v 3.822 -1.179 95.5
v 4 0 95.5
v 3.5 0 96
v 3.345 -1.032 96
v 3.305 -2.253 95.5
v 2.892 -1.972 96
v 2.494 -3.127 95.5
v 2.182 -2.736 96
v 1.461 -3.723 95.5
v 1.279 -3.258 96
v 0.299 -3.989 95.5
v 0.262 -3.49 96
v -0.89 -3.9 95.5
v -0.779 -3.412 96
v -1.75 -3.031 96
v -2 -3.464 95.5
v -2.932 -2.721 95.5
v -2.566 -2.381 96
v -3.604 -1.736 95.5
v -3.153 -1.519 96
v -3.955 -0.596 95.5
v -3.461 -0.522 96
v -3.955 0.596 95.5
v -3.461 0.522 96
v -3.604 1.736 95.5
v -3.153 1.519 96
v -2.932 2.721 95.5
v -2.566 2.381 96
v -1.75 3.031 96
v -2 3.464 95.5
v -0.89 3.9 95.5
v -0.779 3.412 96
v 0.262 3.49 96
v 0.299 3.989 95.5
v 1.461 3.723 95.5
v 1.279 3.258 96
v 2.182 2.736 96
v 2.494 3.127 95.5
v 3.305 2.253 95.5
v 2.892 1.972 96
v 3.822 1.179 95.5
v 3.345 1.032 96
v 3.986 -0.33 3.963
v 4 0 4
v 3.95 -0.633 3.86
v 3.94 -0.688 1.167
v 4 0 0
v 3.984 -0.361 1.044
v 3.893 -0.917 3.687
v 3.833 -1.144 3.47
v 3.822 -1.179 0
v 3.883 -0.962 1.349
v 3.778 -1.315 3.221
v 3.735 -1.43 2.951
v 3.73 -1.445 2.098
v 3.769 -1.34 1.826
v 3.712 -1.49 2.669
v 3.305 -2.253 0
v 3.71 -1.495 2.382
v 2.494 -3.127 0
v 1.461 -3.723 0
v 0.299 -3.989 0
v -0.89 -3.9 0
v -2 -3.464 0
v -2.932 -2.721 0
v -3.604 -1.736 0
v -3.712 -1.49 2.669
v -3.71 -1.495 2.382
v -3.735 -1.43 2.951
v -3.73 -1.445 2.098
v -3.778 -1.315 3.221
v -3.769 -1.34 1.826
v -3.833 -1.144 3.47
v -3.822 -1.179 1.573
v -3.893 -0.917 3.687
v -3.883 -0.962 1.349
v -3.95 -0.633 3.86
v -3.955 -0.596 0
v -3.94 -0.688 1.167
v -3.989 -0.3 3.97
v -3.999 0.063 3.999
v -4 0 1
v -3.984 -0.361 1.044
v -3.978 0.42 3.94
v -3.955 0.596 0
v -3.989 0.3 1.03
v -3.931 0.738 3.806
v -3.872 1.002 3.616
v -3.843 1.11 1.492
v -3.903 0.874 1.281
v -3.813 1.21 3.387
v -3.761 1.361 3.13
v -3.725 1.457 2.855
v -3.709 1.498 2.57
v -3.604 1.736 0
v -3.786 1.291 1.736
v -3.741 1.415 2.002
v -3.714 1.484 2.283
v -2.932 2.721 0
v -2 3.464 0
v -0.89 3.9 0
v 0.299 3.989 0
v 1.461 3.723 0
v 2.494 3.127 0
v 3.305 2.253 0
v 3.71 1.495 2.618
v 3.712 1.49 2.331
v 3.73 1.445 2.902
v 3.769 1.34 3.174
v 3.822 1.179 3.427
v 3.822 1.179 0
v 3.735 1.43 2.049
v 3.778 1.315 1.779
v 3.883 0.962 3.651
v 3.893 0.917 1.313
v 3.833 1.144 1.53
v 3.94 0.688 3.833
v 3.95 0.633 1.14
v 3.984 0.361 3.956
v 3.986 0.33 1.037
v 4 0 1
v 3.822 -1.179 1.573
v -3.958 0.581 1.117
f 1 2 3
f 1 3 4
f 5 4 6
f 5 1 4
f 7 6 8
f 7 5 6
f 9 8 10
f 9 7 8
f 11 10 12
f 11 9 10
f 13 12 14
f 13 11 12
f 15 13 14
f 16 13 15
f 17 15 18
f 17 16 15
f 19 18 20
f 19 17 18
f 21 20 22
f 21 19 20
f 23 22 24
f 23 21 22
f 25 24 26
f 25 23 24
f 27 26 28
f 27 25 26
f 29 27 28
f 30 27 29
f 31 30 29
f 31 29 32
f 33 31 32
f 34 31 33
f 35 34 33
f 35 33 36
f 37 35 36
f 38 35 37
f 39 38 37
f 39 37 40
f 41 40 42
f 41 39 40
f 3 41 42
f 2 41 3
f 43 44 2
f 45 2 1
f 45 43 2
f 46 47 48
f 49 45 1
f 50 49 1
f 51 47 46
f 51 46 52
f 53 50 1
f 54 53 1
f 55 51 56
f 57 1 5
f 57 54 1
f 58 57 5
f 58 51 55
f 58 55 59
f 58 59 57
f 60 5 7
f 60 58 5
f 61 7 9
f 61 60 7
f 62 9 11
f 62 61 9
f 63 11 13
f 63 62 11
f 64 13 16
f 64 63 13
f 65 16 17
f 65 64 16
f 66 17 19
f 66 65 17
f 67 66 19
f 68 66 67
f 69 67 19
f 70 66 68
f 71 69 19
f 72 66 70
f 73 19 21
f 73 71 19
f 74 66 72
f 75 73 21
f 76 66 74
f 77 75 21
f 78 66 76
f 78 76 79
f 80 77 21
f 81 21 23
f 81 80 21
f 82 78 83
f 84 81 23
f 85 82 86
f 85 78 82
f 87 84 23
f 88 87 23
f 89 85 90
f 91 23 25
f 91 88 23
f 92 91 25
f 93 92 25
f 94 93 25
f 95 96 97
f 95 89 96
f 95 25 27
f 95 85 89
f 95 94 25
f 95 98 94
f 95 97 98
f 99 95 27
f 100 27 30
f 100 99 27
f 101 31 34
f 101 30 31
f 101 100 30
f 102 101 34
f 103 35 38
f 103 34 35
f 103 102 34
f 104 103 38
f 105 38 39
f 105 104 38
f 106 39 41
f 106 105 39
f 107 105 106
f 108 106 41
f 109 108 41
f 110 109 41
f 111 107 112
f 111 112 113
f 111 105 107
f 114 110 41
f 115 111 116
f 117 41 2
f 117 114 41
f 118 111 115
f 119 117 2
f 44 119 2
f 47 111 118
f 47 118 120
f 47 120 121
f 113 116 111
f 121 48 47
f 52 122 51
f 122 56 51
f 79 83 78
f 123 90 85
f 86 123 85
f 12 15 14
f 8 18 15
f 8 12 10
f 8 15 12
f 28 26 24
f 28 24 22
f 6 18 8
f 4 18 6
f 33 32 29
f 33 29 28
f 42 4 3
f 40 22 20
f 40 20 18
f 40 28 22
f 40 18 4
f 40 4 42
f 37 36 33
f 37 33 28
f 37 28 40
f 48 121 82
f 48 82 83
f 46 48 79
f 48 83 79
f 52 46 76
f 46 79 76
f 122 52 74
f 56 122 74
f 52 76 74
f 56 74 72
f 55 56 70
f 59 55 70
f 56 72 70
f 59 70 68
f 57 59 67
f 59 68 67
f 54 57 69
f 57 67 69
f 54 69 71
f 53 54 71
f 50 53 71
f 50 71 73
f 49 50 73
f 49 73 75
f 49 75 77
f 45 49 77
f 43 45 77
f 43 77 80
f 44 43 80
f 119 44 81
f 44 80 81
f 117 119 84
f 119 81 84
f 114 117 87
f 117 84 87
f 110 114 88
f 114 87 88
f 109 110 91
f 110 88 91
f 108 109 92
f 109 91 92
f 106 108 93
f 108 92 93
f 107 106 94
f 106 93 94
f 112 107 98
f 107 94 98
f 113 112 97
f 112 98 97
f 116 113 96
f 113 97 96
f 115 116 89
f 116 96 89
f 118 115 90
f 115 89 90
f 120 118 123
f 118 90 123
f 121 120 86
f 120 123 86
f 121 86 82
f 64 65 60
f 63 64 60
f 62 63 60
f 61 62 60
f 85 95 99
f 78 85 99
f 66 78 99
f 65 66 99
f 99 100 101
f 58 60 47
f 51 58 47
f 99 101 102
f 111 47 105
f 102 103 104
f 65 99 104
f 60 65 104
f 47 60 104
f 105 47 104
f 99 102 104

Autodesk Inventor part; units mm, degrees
ref_plane "XZ Plane" through (0, 0, 0) normal (0, 1, 0) x (-1, 0, 0)
ref_plane "XY Plane" through (0, 0, 0) normal (0, 0, 1) x (1, 0, 0)
sketch "Sketch1" plane through (0, 0, 0) normal (0, 0, 1) x (1, 0, 0)
  circle A0 centre (0, 0) radius 4
  dimension "d0" = 8
extrude "Extrusion1" add sketch "Sketch1" along normal blind 96
ref_plane "Work Plane1" through (4, 0, 0) normal (1, 0, 0) x (0, 1, 0)
sketch "Sketch2" plane through (4, 0, 0) normal (1, 0, 0) x (0, 1, 0)
  point P0 (0, 0)
  point P1 (0, 2.5)
  dimension "d4" = 2.5
hole "Hole1" at (4, 0, 2.5) direction (-1, 0, 0) diameter 3 end through all
chamfer "Chamfer1" distance 0.5 angle 45 1 edges at (-4, 0, 96)
properties part number "201 part 5" material "Aluminum 6061-AHC"
